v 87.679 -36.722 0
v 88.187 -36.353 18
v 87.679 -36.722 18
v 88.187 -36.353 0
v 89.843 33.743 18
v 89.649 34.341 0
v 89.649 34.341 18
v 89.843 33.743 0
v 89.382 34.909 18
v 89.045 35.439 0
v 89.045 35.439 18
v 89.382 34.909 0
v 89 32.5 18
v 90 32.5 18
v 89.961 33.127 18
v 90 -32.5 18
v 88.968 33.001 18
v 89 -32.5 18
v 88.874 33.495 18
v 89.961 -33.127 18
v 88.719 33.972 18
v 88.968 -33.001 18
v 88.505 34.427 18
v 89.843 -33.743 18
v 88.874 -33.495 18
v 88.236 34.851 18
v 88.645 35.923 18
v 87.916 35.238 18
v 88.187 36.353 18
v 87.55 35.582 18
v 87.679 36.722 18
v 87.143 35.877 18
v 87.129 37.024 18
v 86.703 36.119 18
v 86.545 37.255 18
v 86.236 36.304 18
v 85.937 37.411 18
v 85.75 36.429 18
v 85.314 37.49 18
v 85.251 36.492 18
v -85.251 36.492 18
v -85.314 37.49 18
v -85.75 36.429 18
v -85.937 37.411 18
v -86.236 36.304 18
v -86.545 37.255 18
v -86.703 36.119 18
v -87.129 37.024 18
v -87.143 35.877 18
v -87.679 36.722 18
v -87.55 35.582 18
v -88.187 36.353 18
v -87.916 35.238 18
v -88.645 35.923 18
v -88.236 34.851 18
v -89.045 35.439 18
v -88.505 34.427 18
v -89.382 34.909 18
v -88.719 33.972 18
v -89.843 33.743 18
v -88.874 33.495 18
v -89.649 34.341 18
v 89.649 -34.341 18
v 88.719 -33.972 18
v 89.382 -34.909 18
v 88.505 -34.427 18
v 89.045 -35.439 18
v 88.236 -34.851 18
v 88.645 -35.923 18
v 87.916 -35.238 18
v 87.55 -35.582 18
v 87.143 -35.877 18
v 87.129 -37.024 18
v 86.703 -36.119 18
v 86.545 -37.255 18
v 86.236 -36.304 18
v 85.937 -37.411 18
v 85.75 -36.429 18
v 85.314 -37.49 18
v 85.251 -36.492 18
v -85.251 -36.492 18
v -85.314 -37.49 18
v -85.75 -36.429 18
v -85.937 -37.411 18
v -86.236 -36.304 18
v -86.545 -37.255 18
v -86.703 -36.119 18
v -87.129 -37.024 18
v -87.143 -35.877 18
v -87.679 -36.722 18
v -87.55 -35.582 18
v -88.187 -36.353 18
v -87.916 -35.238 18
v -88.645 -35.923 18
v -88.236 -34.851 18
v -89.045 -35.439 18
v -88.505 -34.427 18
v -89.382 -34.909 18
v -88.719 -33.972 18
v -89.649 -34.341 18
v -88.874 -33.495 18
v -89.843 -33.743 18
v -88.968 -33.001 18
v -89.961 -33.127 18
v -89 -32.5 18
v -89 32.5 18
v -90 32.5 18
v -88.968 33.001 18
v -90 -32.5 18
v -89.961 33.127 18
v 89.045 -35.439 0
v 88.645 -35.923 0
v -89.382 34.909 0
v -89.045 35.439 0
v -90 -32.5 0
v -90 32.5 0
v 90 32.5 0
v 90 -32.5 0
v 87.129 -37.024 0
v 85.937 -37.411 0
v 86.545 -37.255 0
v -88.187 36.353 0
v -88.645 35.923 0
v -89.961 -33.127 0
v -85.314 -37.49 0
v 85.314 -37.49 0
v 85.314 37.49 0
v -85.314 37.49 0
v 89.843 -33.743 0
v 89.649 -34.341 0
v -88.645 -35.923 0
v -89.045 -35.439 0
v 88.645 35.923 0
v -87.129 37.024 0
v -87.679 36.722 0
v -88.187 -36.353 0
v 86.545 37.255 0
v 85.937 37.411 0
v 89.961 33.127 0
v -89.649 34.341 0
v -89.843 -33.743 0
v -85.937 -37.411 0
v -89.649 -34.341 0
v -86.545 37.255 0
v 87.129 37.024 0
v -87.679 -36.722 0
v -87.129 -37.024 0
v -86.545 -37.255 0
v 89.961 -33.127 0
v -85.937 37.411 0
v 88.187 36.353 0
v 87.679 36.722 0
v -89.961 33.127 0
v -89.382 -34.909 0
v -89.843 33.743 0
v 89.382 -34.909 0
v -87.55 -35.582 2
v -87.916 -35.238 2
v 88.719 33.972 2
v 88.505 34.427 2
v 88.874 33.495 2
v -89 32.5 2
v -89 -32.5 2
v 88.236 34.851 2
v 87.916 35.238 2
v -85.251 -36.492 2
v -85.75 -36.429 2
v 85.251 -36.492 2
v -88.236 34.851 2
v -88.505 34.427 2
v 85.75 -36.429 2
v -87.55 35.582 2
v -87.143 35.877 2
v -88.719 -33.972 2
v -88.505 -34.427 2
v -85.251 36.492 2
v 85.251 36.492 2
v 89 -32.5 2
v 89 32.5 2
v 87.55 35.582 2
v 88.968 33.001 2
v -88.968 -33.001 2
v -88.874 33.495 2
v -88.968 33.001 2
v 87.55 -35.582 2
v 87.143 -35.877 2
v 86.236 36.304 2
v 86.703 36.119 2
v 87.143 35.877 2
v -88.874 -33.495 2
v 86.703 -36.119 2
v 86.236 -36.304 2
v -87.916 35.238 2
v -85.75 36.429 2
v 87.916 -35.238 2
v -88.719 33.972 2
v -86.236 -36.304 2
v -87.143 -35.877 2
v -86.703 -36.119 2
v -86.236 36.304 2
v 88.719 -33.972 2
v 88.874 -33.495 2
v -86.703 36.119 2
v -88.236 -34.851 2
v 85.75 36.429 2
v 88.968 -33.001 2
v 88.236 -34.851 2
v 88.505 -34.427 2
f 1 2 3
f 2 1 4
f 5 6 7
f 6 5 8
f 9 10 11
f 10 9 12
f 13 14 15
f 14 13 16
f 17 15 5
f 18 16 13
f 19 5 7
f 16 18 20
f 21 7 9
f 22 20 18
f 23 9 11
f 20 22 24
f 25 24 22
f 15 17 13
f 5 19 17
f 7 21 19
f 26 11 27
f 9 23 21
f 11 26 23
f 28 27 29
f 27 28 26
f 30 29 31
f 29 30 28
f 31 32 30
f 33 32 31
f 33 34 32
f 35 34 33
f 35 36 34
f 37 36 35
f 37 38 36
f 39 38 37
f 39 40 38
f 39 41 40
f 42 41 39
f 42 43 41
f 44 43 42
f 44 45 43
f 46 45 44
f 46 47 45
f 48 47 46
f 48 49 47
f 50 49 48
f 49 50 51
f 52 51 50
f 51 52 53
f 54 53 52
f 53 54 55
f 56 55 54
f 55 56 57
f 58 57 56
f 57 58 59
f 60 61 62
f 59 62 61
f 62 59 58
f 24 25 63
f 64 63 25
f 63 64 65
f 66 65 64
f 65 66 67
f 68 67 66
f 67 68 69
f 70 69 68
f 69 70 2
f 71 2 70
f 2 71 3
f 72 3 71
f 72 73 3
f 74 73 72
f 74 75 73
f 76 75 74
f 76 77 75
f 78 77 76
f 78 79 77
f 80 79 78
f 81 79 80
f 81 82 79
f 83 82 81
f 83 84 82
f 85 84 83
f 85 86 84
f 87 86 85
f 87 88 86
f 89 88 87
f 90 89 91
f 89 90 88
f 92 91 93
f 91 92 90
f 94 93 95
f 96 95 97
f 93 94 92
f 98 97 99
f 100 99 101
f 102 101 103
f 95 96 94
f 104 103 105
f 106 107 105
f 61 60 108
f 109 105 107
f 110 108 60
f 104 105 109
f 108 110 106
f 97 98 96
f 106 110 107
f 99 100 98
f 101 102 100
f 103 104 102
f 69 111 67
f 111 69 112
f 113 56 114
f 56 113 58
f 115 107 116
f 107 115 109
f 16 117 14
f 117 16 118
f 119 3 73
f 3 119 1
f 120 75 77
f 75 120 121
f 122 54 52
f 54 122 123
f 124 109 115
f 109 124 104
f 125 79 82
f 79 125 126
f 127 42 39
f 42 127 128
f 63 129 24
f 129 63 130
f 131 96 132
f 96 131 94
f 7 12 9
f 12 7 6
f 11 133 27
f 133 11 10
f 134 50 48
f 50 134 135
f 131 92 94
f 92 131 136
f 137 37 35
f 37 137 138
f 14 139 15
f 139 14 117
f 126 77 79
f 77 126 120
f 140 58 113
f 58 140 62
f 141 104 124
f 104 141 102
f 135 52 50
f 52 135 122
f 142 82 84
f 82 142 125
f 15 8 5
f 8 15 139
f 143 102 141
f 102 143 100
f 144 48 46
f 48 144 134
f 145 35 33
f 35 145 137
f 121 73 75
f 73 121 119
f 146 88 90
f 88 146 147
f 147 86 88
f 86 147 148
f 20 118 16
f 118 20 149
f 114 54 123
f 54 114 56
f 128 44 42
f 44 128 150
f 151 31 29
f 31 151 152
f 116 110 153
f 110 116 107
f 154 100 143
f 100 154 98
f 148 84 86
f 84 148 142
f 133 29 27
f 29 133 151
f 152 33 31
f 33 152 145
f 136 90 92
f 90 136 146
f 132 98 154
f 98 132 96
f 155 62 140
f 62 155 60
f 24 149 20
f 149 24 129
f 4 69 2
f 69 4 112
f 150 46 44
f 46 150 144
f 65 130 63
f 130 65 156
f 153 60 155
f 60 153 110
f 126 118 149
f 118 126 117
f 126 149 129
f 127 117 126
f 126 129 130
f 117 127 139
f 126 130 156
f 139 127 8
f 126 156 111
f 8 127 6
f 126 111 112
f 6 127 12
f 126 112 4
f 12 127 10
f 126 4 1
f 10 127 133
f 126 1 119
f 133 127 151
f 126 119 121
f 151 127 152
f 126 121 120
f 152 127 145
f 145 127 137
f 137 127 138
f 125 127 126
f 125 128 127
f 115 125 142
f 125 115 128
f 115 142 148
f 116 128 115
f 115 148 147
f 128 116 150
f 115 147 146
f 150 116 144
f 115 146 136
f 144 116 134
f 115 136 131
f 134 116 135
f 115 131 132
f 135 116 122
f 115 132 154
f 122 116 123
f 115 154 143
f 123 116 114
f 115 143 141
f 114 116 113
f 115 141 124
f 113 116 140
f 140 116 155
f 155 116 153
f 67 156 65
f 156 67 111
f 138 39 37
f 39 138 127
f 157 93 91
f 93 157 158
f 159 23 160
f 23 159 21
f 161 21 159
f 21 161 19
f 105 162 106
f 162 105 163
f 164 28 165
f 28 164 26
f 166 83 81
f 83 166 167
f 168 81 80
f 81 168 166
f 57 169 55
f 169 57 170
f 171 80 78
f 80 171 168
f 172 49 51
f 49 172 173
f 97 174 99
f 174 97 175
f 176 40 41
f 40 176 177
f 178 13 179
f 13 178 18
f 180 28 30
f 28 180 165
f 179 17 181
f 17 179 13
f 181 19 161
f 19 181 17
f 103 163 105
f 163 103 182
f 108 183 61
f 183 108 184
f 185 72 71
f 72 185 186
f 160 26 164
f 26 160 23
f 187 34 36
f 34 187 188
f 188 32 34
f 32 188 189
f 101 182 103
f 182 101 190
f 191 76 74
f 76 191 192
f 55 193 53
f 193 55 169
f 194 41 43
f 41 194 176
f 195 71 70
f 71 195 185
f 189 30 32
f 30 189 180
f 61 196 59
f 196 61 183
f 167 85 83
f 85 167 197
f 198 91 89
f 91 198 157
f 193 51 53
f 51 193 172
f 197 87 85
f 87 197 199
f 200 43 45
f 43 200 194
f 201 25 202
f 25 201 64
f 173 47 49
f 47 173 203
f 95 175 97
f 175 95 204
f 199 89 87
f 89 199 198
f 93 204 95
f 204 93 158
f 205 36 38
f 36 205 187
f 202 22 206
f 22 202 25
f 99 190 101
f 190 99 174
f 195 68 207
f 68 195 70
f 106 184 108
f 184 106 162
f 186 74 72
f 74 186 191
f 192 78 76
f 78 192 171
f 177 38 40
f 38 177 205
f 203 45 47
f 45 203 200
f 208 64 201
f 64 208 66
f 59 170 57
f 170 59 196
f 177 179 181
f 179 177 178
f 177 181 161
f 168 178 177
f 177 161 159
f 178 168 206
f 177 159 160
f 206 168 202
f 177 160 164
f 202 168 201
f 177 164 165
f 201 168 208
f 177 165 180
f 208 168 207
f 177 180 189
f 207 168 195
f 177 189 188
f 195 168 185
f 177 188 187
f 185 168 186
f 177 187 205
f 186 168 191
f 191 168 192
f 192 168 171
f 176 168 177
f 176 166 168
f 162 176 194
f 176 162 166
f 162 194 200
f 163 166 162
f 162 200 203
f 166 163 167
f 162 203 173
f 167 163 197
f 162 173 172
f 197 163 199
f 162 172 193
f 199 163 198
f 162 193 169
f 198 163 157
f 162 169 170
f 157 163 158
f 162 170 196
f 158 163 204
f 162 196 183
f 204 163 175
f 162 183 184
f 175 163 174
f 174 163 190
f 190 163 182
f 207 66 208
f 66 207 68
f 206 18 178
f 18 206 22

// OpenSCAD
$fn = 50;


difference() {
	union() {
		hull() {
			translate(v = [-85.0000000000, 32.5000000000, 0]) {
				cylinder(h = 18, r = 5);
			}
			translate(v = [85.0000000000, 32.5000000000, 0]) {
				cylinder(h = 18, r = 5);
			}
			translate(v = [-85.0000000000, -32.5000000000, 0]) {
				cylinder(h = 18, r = 5);
			}
			translate(v = [85.0000000000, -32.5000000000, 0]) {
				cylinder(h = 18, r = 5);
			}
		}
	}
	union() {
		translate(v = [0, 0, 2]) {
			hull() {
				translate(v = [-85.0000000000, 32.5000000000, 0]) {
					cylinder(h = 16, r = 4);
				}
				translate(v = [85.0000000000, 32.5000000000, 0]) {
					cylinder(h = 16, r = 4);
				}
				translate(v = [-85.0000000000, -32.5000000000, 0]) {
					cylinder(h = 16, r = 4);
				}
				translate(v = [85.0000000000, -32.5000000000, 0]) {
					cylinder(h = 16, r = 4);
				}
			}
		}
	}
}
